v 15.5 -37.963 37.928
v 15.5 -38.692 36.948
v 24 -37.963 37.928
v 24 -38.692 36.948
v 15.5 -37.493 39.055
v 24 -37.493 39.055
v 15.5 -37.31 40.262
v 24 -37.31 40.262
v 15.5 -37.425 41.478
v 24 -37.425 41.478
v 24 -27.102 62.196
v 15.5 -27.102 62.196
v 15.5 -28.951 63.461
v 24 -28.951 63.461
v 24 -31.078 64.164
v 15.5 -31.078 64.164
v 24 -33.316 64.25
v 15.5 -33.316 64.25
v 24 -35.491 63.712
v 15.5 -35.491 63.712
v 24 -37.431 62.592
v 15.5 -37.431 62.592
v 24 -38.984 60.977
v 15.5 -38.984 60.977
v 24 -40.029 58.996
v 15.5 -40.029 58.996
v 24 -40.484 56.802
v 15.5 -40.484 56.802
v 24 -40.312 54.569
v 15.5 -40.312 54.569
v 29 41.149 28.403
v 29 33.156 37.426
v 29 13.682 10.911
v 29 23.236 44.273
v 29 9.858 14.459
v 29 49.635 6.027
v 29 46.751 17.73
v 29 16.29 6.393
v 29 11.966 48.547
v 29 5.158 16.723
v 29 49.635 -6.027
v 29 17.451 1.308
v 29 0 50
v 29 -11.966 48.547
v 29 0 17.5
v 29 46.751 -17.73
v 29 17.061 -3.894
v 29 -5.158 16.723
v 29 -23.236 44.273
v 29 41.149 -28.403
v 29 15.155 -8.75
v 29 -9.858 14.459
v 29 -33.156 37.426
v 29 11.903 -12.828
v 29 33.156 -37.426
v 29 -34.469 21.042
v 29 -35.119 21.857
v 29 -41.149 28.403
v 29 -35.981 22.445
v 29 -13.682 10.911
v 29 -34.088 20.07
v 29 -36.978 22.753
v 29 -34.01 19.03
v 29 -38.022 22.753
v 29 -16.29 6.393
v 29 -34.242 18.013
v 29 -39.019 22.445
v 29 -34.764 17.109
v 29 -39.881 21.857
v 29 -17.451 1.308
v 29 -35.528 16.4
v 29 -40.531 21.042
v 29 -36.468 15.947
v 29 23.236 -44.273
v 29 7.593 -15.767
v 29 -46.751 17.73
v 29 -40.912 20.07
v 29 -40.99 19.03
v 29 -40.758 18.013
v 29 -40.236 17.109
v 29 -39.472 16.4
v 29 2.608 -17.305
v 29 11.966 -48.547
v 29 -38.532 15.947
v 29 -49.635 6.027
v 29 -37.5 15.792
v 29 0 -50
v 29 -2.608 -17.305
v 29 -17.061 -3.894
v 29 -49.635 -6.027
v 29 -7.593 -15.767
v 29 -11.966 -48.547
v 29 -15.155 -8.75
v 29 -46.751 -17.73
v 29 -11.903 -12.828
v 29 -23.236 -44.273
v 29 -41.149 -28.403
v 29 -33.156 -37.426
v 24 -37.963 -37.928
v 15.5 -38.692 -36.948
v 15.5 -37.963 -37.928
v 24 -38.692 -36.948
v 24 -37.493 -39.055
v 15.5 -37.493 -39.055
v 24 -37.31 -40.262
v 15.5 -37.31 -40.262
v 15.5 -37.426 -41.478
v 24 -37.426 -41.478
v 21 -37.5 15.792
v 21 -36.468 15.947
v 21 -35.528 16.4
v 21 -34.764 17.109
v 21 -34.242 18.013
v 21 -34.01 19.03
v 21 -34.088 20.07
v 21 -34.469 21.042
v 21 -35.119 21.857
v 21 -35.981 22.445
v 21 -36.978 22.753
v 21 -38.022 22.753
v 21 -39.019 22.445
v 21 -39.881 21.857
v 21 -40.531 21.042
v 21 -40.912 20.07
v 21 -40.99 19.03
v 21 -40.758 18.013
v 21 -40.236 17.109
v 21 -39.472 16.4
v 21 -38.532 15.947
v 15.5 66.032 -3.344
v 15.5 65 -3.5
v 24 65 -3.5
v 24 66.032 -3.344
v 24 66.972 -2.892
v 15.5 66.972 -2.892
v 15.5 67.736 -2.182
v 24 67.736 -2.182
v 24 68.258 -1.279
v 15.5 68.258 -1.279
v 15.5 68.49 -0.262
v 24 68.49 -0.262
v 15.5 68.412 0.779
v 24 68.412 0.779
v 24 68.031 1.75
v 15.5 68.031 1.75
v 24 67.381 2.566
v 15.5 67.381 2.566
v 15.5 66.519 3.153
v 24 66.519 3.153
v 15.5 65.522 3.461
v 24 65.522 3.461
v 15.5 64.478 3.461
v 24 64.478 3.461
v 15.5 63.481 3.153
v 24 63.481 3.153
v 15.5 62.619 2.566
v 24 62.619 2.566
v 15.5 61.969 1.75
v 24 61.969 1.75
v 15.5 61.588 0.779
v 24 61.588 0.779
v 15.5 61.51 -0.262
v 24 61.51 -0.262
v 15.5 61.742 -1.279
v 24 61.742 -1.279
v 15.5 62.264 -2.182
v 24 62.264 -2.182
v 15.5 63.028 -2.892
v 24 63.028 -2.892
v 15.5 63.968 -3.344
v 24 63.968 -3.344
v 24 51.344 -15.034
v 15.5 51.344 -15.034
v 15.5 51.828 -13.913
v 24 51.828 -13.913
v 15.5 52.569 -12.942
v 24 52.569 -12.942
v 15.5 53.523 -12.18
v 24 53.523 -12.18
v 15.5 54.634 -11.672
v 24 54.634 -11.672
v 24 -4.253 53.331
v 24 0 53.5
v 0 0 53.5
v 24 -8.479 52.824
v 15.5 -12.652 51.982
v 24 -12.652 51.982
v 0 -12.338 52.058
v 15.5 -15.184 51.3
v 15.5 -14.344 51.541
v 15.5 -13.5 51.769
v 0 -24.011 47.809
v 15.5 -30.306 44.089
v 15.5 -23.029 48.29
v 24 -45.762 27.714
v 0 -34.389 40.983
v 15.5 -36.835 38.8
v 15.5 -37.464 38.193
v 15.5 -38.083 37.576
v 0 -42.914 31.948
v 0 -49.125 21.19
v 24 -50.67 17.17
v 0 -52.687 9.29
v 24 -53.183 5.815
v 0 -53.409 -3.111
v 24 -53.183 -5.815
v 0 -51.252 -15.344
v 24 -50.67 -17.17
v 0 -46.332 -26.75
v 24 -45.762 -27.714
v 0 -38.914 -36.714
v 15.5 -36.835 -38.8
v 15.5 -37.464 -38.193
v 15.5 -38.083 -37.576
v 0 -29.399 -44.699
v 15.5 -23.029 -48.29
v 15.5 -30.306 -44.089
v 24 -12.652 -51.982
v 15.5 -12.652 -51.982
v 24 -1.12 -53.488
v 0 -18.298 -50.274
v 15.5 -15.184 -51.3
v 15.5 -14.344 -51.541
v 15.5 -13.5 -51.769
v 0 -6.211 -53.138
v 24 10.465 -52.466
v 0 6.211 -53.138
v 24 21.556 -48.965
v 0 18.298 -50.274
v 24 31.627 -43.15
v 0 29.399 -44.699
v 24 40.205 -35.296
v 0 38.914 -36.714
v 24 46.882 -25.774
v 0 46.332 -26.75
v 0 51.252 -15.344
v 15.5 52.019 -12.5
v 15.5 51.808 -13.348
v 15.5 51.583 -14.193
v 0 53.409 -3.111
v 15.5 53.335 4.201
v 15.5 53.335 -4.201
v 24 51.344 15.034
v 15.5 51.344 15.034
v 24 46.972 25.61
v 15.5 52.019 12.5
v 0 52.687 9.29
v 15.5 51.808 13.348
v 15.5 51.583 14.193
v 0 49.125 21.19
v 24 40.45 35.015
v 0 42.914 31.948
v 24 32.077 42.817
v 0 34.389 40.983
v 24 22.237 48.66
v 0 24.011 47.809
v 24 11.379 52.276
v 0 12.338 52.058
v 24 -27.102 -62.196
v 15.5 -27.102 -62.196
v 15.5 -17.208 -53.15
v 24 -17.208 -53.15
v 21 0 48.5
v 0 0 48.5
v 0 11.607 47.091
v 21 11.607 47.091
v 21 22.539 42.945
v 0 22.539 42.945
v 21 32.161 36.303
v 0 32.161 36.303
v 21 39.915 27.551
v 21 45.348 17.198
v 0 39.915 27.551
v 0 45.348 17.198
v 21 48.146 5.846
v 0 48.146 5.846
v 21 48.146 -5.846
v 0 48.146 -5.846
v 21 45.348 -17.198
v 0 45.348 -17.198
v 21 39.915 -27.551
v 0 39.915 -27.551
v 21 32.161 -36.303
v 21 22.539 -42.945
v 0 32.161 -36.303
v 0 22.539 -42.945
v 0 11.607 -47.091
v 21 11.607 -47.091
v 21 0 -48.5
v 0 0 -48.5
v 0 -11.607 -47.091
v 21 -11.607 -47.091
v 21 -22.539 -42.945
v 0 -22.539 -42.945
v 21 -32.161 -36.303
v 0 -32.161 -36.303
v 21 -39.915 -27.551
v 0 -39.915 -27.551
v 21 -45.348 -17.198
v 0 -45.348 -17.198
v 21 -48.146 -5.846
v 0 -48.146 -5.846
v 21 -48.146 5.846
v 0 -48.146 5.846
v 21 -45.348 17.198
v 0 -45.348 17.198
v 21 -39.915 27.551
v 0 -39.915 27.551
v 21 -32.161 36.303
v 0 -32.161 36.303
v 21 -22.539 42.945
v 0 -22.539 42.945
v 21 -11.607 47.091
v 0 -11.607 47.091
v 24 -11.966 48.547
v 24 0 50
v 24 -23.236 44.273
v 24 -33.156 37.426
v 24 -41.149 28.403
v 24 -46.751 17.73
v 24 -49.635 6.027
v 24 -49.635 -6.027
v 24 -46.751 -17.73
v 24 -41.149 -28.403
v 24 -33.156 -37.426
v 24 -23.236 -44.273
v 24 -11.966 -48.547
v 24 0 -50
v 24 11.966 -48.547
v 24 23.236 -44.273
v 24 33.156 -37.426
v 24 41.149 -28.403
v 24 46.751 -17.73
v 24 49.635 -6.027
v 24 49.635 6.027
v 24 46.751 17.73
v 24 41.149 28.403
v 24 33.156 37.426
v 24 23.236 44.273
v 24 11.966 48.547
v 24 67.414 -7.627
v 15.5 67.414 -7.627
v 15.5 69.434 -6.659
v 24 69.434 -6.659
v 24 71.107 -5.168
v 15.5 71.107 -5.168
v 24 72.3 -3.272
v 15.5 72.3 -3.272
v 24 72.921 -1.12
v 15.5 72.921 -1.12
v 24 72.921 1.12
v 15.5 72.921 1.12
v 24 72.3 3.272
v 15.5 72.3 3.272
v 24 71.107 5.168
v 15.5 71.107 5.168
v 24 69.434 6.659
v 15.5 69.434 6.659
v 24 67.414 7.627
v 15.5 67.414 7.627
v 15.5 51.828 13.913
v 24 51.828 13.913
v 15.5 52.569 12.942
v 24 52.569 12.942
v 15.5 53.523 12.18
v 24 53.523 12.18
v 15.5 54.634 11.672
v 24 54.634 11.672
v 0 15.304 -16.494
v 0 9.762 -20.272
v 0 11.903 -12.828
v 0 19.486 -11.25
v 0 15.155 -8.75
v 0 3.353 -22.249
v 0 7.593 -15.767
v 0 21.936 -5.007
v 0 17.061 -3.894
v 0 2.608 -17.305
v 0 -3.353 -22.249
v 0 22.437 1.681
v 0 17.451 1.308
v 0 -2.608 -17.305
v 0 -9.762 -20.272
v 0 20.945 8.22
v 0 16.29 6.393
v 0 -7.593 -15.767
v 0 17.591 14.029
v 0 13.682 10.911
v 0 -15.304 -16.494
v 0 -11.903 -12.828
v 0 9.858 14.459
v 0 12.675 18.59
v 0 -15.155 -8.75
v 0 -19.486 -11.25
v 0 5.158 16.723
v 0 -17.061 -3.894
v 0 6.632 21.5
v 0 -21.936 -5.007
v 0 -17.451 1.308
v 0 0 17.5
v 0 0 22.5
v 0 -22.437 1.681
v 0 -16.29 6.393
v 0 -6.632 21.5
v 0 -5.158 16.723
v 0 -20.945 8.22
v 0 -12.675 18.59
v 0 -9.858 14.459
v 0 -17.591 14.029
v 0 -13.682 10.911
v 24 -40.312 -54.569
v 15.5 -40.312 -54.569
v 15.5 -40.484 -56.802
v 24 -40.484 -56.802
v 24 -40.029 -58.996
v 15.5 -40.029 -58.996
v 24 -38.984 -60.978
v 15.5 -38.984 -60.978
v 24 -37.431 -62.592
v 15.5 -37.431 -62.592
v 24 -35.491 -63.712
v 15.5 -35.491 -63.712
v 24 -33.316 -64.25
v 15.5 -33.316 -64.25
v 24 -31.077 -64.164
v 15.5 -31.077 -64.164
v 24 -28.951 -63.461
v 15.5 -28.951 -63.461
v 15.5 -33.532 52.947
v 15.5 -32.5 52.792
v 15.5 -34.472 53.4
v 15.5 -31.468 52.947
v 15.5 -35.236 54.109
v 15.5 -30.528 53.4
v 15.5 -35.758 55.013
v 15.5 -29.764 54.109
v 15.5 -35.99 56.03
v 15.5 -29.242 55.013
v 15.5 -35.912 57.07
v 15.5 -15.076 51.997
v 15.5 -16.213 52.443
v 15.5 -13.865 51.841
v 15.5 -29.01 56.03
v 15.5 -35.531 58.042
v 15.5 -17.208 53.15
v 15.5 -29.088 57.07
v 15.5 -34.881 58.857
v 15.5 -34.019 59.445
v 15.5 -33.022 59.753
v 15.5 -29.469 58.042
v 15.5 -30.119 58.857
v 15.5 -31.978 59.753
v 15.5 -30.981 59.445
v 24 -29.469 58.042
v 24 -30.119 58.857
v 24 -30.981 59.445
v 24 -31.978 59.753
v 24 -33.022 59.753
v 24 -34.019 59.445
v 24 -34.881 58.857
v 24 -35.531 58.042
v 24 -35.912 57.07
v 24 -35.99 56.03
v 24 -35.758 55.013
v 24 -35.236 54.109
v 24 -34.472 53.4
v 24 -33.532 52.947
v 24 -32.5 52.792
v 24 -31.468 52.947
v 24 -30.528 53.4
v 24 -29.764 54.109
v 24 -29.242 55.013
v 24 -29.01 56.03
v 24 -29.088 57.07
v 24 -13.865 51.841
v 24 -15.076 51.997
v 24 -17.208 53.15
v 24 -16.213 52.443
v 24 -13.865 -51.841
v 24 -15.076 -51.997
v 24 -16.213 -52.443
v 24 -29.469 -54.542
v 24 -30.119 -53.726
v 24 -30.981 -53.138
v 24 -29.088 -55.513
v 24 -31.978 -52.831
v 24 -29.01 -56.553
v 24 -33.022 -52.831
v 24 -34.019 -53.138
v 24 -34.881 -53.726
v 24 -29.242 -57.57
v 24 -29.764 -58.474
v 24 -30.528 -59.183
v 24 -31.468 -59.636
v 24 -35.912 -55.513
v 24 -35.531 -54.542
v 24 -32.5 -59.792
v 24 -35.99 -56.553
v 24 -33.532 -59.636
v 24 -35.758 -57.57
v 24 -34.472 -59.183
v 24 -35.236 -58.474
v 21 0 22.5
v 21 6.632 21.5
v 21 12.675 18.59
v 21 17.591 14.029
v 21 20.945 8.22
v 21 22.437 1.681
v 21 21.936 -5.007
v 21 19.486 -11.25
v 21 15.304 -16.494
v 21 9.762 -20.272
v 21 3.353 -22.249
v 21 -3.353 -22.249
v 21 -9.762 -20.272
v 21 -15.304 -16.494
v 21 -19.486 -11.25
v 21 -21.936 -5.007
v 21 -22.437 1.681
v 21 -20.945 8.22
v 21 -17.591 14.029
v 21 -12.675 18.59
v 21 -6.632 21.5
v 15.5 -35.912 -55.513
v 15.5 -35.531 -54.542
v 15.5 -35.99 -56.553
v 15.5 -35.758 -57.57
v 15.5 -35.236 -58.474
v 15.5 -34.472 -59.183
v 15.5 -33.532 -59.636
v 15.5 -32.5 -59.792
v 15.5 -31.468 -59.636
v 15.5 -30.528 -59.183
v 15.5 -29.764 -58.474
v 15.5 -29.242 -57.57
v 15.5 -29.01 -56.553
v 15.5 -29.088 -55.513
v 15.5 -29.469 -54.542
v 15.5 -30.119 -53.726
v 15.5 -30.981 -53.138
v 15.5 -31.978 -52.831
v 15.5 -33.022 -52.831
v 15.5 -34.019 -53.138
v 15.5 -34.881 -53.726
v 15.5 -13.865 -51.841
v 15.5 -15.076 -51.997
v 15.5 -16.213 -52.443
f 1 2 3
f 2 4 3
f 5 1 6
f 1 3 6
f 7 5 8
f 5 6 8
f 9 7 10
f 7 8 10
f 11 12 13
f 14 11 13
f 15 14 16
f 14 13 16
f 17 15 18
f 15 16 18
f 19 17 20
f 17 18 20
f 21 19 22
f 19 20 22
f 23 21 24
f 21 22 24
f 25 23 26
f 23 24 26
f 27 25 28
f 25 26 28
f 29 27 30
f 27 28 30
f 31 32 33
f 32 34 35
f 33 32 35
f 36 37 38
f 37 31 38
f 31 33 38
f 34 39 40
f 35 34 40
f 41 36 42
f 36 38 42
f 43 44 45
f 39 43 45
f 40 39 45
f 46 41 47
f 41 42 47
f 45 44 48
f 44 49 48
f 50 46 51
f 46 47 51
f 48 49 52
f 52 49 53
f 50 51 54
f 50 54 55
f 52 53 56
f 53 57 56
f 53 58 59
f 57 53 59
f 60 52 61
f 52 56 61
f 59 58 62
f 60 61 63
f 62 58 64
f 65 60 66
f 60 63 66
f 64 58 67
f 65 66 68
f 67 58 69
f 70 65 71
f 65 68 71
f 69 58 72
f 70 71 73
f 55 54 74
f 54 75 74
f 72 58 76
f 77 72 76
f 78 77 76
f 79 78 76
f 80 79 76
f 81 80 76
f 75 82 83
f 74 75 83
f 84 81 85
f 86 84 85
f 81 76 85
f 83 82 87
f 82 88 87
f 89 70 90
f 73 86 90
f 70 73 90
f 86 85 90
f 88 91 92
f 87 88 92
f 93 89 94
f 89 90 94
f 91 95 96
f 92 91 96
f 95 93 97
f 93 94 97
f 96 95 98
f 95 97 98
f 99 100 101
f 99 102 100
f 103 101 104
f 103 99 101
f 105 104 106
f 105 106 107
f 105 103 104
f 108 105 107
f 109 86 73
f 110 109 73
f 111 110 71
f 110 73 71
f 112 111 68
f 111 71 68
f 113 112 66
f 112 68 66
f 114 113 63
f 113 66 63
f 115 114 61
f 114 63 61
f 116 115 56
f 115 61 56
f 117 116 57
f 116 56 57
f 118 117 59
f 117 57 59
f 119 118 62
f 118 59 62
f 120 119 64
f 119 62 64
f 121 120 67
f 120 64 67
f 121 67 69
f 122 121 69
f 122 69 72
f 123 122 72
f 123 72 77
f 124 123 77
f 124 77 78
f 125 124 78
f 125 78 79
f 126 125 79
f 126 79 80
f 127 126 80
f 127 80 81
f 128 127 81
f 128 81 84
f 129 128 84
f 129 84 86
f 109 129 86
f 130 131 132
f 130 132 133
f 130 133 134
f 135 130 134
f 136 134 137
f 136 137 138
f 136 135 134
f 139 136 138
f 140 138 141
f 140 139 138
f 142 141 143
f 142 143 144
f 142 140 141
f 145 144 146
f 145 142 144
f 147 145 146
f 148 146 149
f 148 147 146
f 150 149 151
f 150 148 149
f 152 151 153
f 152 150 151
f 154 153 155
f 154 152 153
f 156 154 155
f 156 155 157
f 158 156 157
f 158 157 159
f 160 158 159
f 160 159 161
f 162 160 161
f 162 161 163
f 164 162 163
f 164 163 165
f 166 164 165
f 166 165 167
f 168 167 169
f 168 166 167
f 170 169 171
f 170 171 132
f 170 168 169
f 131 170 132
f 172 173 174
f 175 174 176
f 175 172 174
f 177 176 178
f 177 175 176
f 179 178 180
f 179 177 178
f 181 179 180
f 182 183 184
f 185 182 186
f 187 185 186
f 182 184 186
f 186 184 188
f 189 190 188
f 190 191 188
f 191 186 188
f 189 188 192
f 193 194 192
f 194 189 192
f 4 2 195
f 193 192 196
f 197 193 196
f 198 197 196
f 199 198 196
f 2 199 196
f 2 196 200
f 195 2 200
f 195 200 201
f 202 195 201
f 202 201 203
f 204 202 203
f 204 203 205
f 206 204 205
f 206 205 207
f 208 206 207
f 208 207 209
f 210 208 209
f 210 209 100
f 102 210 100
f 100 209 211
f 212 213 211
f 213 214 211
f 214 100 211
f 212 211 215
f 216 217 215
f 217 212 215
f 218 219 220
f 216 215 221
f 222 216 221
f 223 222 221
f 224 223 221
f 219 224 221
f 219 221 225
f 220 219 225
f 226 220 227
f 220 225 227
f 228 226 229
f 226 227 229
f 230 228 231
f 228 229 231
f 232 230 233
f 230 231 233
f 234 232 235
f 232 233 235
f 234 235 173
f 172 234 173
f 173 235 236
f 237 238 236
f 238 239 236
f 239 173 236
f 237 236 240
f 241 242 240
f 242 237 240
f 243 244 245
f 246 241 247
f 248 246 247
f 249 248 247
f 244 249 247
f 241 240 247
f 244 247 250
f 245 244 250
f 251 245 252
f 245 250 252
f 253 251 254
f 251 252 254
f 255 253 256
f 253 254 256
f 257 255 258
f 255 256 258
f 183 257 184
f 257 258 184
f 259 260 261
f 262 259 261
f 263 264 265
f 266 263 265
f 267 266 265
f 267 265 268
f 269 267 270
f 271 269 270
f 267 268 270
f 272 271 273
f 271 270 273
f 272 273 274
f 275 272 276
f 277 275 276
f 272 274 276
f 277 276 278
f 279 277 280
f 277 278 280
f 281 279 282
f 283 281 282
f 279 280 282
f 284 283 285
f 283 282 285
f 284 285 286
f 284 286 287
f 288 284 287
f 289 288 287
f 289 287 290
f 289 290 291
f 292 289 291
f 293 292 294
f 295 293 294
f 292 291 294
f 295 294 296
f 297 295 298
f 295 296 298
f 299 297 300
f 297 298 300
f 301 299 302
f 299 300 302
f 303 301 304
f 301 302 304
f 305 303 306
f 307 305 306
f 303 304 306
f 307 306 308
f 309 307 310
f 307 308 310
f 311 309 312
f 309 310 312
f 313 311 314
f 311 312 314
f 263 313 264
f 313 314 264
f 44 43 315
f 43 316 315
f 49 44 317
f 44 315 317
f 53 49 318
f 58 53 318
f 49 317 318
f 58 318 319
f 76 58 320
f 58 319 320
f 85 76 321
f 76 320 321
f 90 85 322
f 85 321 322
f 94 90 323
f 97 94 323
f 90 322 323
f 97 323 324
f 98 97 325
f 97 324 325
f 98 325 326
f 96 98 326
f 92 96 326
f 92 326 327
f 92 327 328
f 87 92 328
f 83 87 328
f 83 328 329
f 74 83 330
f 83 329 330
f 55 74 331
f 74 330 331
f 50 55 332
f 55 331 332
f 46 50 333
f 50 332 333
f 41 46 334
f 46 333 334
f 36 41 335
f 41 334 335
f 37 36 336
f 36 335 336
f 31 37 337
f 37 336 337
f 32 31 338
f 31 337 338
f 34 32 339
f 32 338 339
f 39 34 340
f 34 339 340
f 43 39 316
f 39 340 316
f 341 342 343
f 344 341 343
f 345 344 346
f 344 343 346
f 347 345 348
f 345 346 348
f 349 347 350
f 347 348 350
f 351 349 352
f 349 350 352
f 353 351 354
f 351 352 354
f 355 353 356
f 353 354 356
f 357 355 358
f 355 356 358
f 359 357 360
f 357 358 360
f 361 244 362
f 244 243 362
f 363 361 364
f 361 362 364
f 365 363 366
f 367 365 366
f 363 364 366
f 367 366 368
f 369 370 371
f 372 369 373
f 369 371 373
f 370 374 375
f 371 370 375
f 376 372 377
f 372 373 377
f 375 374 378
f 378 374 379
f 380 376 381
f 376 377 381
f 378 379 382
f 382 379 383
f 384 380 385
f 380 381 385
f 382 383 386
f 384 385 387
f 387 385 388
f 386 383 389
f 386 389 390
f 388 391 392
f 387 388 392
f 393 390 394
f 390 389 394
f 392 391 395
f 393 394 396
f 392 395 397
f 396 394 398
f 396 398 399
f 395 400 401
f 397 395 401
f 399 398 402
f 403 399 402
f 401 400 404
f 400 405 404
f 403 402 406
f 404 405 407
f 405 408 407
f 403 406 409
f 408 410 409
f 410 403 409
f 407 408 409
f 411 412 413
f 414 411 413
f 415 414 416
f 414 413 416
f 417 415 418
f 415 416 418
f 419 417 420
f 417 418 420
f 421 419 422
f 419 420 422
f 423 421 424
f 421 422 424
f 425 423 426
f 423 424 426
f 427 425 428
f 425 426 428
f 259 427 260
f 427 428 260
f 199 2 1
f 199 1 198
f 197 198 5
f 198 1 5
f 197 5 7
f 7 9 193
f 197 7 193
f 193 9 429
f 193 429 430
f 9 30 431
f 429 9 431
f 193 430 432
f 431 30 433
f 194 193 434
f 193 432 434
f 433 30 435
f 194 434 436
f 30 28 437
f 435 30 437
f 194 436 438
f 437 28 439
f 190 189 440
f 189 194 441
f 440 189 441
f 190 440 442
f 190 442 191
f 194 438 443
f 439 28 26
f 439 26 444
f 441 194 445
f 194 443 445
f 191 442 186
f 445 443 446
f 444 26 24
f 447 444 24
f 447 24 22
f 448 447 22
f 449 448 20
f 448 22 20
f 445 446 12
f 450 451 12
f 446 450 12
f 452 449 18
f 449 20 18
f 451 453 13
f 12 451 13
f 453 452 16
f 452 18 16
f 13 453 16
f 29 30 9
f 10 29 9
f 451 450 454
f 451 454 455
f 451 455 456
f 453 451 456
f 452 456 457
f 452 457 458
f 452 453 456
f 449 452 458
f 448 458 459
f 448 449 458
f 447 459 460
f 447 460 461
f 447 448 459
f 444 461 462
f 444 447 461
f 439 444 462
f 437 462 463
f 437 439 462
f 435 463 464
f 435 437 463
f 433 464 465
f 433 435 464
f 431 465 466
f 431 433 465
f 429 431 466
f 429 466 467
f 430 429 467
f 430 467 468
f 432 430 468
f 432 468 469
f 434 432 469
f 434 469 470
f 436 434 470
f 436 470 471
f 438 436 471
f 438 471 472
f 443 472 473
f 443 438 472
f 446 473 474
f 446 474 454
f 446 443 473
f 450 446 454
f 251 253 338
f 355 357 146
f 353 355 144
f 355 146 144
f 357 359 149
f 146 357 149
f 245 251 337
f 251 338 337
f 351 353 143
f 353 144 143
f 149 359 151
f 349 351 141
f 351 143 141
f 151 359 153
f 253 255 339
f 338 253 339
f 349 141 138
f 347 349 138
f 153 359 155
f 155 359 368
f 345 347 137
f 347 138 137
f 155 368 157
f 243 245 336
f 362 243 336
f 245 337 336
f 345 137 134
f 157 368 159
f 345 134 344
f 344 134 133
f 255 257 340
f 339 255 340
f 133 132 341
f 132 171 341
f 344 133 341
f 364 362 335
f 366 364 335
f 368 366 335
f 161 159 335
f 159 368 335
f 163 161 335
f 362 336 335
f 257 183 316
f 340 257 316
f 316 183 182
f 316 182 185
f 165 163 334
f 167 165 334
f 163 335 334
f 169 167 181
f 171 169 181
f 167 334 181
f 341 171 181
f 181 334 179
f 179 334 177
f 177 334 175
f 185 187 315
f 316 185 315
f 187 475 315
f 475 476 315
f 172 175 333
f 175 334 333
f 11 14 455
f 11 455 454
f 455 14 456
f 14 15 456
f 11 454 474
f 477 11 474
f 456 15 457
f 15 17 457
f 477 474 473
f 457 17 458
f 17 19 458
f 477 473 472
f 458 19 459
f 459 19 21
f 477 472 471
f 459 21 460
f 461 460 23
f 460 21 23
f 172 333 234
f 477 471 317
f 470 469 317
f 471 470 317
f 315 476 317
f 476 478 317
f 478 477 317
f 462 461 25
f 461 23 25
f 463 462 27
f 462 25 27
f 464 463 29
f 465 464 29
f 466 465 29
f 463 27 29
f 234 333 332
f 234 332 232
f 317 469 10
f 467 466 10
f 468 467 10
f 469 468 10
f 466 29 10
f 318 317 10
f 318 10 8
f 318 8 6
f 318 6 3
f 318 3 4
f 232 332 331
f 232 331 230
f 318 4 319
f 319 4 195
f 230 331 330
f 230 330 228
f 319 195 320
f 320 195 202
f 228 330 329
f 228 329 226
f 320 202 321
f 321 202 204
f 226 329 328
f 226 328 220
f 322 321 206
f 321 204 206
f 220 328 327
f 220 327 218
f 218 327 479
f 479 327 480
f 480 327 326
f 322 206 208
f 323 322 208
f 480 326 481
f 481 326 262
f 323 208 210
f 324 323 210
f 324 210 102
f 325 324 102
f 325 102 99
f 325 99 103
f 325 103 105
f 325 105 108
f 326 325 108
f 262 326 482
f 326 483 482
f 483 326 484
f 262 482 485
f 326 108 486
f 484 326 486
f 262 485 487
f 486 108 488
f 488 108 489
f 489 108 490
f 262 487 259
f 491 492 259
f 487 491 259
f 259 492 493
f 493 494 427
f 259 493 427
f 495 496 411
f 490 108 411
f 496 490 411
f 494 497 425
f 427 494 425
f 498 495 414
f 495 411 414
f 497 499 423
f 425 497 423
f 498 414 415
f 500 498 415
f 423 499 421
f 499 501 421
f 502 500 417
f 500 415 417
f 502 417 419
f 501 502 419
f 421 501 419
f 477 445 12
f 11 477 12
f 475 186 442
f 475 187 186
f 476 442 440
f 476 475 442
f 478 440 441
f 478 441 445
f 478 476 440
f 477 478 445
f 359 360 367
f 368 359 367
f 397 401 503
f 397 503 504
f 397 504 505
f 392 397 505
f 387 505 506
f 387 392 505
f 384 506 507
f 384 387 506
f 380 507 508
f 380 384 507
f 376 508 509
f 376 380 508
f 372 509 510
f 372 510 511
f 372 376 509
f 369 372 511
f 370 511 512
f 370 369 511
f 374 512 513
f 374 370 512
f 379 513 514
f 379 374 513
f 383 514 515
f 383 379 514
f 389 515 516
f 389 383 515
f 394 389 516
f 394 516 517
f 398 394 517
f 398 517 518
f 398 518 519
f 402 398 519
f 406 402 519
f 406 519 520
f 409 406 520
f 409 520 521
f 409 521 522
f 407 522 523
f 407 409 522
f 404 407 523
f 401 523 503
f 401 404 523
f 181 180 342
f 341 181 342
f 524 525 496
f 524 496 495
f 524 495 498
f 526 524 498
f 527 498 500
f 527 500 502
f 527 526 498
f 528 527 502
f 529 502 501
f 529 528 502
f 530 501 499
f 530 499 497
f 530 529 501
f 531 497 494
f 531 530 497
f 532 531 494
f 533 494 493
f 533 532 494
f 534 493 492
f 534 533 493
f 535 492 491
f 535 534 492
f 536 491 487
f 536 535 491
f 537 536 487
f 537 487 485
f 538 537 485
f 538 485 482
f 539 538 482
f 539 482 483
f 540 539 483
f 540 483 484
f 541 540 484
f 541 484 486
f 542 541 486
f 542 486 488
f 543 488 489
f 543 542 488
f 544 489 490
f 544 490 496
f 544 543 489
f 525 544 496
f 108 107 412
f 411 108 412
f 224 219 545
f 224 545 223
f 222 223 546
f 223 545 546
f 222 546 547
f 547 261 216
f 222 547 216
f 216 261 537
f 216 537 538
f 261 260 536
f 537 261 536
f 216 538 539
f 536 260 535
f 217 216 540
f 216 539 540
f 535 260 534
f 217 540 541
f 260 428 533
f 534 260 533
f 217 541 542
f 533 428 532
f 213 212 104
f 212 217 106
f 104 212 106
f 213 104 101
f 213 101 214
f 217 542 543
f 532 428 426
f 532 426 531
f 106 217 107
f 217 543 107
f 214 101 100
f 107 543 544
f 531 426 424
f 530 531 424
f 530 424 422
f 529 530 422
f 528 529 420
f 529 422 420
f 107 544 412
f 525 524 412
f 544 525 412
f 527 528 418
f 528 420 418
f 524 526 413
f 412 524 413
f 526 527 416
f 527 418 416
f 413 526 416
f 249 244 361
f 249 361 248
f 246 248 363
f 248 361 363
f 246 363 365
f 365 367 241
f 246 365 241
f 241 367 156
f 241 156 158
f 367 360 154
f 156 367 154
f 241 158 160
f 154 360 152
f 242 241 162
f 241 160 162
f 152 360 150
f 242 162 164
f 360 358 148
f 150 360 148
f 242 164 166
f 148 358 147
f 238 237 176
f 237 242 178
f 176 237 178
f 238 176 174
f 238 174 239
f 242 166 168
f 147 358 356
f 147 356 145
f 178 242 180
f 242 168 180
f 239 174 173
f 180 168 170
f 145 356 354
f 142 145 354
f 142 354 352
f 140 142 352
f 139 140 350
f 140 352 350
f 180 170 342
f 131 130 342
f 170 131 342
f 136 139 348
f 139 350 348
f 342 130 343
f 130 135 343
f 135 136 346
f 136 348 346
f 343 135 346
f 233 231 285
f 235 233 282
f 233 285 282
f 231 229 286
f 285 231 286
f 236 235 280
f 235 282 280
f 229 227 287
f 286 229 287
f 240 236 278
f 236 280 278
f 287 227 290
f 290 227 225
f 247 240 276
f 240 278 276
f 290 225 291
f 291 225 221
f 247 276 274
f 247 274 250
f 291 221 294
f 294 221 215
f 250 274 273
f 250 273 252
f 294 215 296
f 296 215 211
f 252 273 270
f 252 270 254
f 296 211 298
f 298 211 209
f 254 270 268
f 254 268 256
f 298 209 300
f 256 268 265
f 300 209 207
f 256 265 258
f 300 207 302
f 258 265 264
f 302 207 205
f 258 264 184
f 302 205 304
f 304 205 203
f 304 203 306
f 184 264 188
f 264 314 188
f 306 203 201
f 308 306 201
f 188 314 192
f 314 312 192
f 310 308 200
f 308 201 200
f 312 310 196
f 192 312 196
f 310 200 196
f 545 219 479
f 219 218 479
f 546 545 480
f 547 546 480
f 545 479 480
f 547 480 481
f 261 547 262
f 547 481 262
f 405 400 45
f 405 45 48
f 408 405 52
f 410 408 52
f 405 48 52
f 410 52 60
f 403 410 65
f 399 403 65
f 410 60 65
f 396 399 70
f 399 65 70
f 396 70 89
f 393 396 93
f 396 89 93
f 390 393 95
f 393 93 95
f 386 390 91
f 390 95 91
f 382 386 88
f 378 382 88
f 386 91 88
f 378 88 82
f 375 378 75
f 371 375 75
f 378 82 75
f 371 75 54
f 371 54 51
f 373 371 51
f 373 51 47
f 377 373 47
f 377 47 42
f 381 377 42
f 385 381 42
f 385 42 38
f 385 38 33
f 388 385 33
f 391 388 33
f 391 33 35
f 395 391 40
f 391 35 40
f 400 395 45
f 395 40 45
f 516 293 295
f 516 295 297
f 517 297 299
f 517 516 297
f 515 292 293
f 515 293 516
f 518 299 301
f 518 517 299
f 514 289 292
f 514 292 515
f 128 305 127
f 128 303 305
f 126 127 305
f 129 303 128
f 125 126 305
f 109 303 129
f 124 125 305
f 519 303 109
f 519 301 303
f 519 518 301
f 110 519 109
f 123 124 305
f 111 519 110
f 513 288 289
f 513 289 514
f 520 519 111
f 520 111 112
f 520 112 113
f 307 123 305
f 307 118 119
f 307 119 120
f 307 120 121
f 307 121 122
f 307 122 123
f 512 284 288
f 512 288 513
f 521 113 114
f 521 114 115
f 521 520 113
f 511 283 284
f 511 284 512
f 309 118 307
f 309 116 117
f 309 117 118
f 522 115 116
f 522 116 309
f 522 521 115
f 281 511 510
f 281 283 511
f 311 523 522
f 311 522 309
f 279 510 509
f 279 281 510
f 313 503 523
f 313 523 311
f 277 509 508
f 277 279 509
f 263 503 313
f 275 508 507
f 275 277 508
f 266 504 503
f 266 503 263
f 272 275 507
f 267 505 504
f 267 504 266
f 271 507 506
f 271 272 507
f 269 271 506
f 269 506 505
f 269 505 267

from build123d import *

# Parameters (mm, degrees)
EXTRUS_O1_START          = -8.5
EXTRUS_O1_OUTLINE_R      = 3.5
EXTRUS_O1_DEPTH          = 8.5
FILETE1_R                = 5
CIRPATTERN1_COUNT        = 3
FILETE1_OF_CIRPATTERN1_R = 5
ESBO_O3_R                = 48.5
ESBO_O3_R_2              = 22.5
CORTE_EXTRUS_O1_DEPTH    = 21
ESBO_O4_R                = 3.5
CORTE_EXTRUS_O2_DEPTH    = 102.505753245


# Read off the part's stored shape, not the designer's step: Extrusão1
with BuildPart() as part:
    # Esboço1 → Revolução1 (revolve)
    with BuildSketch(Plane.XY, mode=Mode.PRIVATE) as revolu_o1_sk:
        Polygon((0, 17.5), (29, 17.5), (29, 50), (24, 50), (24, 53.5), (0, 53.5), align=None)
    revolve(revolu_o1_sk.sketch.rotate(Axis((0, 0, 0), (1, 0, 0)), 90), axis=Axis((0, 0, 0), (1, 0, 0)))

    # Extrusão1 outline → Extrusão1 (add)
    with BuildSketch(Plane(origin=(24, 0, 0), x_dir=(0, 0, -1), z_dir=(1, 0, 0)).offset(EXTRUS_O1_START)):
        with BuildLine():
            Line((-7.627068165, 67.414164927), (-12.499978821, 52.019232304))
            ThreePointArc((-12.499978821, 52.019232304), (1.2458e-05, 53.5), (12.500003048, 52.019226482))
            Line((12.500003048, 52.019226482), (7.627010883, 67.414196325))
            ThreePointArc((7.627010883, 67.414196325), (-4.0138e-05, 73), (-7.627068165, 67.414164927))
        make_face()
        with Locations((-2.3672e-05, 65)):
            Circle(EXTRUS_O1_OUTLINE_R, mode=Mode.SUBTRACT)
    extrus_o1 = extrude(amount=EXTRUS_O1_DEPTH)

    # Filete1
    filete1_edges = [part.edges().sort_by_distance(p)[0] for p in [
        (19.75, 52.019232304, 12.499978821),
        (19.75, 52.019226482, -12.500003048),
    ]]
    fillet(filete1_edges, radius=FILETE1_R)

    # CirPattern1: Extrusão1 ×3 about axis
    cirpattern1_axis = Axis((0, 0, 0), (1, 0, 0))
    for i in range(1, CIRPATTERN1_COUNT):
        add(extrus_o1.rotate(cirpattern1_axis, i * 360 / CIRPATTERN1_COUNT))

    # Filete1 of CirPattern1
    filete1_of_cirpattern1_edges = [part.edges().sort_by_distance(p)[0] for p in [
        (19.75, -36.834915358, 38.79998725),
        (19.75, -15.184293054, 51.299973143),
        (19.75, -15.184316946, -51.299966071),
        (19.75, -36.834933428, -38.799970095),
    ]]
    fillet(filete1_of_cirpattern1_edges, radius=FILETE1_OF_CIRPATTERN1_R)

    # Esboço3 → Corte-extrusão1 (cut)
    with BuildSketch(Plane.ZY):
        Circle(ESBO_O3_R)
        Circle(ESBO_O3_R_2, mode=Mode.SUBTRACT)
    extrude(amount=-CORTE_EXTRUS_O1_DEPTH, mode=Mode.SUBTRACT)

    # Esboço4 → Corte-extrusão2 (cut, through all)
    with BuildSketch(Plane(origin=(29, 0, 0), x_dir=(0, 0, -1), z_dir=(1, 0, 0))):
        with Locations((-19.29163941, -37.5000205)):
            Circle(ESBO_O4_R)
    extrude(amount=-CORTE_EXTRUS_O2_DEPTH, mode=Mode.SUBTRACT)


solid = part.part
